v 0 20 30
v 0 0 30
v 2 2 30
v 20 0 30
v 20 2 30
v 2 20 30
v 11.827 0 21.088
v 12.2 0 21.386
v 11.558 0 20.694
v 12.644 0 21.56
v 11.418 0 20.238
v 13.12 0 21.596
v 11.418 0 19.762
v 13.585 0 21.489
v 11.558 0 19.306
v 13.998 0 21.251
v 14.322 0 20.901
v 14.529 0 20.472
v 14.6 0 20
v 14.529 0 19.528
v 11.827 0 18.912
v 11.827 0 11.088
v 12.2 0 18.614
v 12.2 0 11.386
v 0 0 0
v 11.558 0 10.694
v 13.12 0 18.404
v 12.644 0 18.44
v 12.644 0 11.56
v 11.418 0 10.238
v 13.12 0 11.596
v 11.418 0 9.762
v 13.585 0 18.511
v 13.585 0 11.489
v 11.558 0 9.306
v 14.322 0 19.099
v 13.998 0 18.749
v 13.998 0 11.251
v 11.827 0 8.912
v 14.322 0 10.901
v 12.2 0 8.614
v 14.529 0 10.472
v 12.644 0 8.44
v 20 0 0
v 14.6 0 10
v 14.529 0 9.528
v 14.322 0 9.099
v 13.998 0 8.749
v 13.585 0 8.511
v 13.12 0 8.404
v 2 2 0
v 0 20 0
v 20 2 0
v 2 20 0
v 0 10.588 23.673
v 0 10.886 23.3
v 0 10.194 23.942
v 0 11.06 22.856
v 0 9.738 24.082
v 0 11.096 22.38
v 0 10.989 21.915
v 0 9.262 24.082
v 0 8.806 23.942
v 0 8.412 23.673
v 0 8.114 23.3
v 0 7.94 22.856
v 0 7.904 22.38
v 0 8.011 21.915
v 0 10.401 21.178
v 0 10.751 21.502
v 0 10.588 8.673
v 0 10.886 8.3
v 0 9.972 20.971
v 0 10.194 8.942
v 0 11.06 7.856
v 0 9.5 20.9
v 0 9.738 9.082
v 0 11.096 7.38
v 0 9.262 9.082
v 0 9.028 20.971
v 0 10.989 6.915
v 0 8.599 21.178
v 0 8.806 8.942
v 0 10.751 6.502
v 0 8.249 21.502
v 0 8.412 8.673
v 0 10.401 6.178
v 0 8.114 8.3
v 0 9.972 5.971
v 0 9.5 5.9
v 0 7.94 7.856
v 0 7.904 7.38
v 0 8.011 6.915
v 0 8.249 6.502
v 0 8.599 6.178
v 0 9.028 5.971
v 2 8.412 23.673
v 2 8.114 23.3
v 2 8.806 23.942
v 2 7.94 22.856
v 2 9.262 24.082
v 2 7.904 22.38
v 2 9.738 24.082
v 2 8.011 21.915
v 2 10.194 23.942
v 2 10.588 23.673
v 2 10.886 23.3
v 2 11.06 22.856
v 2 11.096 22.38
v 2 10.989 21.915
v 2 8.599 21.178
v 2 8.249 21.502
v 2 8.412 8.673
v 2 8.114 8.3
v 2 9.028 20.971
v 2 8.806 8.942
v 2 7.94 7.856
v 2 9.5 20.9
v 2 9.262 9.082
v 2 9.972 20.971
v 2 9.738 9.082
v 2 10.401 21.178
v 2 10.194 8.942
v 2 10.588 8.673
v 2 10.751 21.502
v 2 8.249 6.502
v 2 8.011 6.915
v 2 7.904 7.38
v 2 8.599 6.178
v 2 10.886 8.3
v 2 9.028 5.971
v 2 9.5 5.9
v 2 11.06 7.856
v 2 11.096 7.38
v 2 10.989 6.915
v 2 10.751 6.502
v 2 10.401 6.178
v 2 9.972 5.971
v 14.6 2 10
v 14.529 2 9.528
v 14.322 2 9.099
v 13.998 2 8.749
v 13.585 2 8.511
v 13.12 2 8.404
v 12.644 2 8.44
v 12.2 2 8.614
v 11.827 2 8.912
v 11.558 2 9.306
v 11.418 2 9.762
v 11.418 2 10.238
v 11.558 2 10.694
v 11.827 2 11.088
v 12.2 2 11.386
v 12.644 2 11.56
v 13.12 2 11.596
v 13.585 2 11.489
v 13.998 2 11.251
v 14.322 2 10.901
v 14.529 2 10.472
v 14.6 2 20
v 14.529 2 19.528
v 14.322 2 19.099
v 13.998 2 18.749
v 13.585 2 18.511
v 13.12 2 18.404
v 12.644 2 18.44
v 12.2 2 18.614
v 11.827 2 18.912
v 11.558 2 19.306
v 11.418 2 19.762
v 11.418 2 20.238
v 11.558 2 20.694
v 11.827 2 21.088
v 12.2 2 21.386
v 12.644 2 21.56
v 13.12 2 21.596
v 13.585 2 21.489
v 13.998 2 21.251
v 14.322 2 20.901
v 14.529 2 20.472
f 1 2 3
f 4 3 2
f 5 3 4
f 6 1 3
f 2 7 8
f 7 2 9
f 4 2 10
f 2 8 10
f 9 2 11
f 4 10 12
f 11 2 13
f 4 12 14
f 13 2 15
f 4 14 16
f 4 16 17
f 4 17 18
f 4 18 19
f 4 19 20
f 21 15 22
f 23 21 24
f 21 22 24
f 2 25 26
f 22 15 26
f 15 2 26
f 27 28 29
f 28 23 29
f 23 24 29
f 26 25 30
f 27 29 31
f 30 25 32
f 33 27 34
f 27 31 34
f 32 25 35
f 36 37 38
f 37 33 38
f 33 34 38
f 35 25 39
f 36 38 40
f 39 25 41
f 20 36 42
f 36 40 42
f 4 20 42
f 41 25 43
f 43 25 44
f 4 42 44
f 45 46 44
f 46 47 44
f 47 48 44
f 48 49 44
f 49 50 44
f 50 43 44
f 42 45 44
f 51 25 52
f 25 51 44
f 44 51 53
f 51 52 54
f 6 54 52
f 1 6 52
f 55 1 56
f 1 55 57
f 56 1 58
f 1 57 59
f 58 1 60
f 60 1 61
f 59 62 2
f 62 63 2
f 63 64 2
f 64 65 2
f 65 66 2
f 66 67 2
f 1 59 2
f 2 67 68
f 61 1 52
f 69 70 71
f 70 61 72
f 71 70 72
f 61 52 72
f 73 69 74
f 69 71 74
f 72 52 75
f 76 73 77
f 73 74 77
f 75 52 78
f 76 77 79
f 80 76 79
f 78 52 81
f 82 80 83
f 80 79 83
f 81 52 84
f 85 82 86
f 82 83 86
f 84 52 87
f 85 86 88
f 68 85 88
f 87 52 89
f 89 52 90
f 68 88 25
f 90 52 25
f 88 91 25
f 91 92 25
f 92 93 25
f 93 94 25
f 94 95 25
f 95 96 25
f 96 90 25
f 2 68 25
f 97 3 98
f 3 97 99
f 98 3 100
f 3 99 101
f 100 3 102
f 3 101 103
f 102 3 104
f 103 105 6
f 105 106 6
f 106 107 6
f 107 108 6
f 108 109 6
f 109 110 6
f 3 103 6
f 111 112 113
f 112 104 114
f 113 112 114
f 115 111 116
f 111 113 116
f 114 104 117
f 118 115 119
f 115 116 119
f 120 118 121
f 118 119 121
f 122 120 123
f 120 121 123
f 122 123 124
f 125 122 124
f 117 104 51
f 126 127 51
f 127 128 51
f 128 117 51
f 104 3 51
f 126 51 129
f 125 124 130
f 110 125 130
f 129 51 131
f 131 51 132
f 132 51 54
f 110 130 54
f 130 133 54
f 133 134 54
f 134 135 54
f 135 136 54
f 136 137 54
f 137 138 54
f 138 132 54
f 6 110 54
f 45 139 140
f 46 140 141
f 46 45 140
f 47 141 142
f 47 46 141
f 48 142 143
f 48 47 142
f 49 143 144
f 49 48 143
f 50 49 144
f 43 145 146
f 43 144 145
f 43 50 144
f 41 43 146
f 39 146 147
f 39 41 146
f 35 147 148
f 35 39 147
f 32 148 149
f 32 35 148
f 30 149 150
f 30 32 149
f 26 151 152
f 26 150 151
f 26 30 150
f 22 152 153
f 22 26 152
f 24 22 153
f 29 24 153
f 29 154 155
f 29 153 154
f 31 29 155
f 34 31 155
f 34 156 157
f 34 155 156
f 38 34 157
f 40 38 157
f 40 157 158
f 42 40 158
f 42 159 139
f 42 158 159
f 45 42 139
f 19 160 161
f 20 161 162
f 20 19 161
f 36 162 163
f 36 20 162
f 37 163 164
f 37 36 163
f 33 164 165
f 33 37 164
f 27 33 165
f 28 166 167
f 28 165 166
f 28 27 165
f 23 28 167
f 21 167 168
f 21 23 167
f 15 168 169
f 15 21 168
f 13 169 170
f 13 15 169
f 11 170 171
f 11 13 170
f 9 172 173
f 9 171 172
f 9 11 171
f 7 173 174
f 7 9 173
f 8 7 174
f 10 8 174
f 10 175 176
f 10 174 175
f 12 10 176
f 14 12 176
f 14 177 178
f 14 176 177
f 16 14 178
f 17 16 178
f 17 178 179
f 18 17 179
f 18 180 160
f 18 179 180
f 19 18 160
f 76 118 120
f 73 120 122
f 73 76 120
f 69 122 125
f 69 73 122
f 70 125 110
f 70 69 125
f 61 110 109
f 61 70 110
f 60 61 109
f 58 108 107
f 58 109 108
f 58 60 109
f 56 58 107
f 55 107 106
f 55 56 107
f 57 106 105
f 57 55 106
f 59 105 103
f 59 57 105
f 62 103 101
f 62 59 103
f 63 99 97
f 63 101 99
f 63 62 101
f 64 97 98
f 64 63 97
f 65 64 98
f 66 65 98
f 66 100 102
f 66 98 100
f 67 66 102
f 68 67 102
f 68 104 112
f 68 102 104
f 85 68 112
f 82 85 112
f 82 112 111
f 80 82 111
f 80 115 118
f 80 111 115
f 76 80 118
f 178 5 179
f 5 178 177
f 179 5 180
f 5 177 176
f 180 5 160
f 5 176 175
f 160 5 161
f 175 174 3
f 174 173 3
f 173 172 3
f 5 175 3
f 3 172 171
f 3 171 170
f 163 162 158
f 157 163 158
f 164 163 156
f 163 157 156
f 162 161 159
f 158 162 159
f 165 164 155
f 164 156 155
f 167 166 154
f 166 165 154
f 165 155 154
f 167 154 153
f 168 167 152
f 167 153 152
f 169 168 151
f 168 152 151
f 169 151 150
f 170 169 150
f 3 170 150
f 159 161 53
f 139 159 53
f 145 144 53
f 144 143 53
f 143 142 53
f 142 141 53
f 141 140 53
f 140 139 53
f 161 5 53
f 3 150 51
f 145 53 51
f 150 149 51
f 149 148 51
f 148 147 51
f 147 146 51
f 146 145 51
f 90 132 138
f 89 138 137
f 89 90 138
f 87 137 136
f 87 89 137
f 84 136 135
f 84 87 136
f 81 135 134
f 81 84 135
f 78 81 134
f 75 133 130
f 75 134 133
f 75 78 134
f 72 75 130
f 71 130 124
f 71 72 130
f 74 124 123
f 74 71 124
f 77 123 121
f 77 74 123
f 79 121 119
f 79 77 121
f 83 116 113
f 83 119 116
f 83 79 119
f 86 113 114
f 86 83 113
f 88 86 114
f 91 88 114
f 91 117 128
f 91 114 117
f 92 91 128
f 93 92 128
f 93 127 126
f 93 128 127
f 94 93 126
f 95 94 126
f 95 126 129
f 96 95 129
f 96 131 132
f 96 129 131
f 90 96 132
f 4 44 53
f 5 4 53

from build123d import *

# Parameters (mm, degrees)
BOSS_EXTRUDE1_DEPTH = 30
SKETCH2_R           = 1.6
CUT_EXTRUDE1_DEPTH  = 10
SKETCH3_R           = 1.6
CUT_EXTRUDE2_DEPTH  = 4


with BuildPart() as part:
    # Sketch1 → Boss-Extrude1 (new body)
    with BuildSketch(Plane.XY):
        Polygon((0, 20), (0, 0), (20, 0), (20, 2), (2, 2), (2, 20), align=None)
    extrude(amount=BOSS_EXTRUDE1_DEPTH)

    # Sketch2 → Cut-Extrude1 (cut)
    with BuildSketch(Plane(origin=(0, 0, 0), x_dir=(0, 0, -1), z_dir=(1, 0, 0))):
        with Locations((-22.5, 9.5)):
            Circle(SKETCH2_R)
        with Locations((-7.5, 9.5)):
            Circle(SKETCH2_R)
    extrude(amount=CUT_EXTRUDE1_DEPTH, mode=Mode.SUBTRACT)

    # Sketch3 → Cut-Extrude2 (cut)
    with BuildSketch(Plane(origin=(0, 0, 0), x_dir=(1, 0, 0), z_dir=(0, 1, 0))):
        with Locations((13, -10)):
            Circle(SKETCH3_R)
        with Locations((13, -20)):
            Circle(SKETCH3_R)
    extrude(amount=CUT_EXTRUDE2_DEPTH, mode=Mode.SUBTRACT)


solid = part.part
